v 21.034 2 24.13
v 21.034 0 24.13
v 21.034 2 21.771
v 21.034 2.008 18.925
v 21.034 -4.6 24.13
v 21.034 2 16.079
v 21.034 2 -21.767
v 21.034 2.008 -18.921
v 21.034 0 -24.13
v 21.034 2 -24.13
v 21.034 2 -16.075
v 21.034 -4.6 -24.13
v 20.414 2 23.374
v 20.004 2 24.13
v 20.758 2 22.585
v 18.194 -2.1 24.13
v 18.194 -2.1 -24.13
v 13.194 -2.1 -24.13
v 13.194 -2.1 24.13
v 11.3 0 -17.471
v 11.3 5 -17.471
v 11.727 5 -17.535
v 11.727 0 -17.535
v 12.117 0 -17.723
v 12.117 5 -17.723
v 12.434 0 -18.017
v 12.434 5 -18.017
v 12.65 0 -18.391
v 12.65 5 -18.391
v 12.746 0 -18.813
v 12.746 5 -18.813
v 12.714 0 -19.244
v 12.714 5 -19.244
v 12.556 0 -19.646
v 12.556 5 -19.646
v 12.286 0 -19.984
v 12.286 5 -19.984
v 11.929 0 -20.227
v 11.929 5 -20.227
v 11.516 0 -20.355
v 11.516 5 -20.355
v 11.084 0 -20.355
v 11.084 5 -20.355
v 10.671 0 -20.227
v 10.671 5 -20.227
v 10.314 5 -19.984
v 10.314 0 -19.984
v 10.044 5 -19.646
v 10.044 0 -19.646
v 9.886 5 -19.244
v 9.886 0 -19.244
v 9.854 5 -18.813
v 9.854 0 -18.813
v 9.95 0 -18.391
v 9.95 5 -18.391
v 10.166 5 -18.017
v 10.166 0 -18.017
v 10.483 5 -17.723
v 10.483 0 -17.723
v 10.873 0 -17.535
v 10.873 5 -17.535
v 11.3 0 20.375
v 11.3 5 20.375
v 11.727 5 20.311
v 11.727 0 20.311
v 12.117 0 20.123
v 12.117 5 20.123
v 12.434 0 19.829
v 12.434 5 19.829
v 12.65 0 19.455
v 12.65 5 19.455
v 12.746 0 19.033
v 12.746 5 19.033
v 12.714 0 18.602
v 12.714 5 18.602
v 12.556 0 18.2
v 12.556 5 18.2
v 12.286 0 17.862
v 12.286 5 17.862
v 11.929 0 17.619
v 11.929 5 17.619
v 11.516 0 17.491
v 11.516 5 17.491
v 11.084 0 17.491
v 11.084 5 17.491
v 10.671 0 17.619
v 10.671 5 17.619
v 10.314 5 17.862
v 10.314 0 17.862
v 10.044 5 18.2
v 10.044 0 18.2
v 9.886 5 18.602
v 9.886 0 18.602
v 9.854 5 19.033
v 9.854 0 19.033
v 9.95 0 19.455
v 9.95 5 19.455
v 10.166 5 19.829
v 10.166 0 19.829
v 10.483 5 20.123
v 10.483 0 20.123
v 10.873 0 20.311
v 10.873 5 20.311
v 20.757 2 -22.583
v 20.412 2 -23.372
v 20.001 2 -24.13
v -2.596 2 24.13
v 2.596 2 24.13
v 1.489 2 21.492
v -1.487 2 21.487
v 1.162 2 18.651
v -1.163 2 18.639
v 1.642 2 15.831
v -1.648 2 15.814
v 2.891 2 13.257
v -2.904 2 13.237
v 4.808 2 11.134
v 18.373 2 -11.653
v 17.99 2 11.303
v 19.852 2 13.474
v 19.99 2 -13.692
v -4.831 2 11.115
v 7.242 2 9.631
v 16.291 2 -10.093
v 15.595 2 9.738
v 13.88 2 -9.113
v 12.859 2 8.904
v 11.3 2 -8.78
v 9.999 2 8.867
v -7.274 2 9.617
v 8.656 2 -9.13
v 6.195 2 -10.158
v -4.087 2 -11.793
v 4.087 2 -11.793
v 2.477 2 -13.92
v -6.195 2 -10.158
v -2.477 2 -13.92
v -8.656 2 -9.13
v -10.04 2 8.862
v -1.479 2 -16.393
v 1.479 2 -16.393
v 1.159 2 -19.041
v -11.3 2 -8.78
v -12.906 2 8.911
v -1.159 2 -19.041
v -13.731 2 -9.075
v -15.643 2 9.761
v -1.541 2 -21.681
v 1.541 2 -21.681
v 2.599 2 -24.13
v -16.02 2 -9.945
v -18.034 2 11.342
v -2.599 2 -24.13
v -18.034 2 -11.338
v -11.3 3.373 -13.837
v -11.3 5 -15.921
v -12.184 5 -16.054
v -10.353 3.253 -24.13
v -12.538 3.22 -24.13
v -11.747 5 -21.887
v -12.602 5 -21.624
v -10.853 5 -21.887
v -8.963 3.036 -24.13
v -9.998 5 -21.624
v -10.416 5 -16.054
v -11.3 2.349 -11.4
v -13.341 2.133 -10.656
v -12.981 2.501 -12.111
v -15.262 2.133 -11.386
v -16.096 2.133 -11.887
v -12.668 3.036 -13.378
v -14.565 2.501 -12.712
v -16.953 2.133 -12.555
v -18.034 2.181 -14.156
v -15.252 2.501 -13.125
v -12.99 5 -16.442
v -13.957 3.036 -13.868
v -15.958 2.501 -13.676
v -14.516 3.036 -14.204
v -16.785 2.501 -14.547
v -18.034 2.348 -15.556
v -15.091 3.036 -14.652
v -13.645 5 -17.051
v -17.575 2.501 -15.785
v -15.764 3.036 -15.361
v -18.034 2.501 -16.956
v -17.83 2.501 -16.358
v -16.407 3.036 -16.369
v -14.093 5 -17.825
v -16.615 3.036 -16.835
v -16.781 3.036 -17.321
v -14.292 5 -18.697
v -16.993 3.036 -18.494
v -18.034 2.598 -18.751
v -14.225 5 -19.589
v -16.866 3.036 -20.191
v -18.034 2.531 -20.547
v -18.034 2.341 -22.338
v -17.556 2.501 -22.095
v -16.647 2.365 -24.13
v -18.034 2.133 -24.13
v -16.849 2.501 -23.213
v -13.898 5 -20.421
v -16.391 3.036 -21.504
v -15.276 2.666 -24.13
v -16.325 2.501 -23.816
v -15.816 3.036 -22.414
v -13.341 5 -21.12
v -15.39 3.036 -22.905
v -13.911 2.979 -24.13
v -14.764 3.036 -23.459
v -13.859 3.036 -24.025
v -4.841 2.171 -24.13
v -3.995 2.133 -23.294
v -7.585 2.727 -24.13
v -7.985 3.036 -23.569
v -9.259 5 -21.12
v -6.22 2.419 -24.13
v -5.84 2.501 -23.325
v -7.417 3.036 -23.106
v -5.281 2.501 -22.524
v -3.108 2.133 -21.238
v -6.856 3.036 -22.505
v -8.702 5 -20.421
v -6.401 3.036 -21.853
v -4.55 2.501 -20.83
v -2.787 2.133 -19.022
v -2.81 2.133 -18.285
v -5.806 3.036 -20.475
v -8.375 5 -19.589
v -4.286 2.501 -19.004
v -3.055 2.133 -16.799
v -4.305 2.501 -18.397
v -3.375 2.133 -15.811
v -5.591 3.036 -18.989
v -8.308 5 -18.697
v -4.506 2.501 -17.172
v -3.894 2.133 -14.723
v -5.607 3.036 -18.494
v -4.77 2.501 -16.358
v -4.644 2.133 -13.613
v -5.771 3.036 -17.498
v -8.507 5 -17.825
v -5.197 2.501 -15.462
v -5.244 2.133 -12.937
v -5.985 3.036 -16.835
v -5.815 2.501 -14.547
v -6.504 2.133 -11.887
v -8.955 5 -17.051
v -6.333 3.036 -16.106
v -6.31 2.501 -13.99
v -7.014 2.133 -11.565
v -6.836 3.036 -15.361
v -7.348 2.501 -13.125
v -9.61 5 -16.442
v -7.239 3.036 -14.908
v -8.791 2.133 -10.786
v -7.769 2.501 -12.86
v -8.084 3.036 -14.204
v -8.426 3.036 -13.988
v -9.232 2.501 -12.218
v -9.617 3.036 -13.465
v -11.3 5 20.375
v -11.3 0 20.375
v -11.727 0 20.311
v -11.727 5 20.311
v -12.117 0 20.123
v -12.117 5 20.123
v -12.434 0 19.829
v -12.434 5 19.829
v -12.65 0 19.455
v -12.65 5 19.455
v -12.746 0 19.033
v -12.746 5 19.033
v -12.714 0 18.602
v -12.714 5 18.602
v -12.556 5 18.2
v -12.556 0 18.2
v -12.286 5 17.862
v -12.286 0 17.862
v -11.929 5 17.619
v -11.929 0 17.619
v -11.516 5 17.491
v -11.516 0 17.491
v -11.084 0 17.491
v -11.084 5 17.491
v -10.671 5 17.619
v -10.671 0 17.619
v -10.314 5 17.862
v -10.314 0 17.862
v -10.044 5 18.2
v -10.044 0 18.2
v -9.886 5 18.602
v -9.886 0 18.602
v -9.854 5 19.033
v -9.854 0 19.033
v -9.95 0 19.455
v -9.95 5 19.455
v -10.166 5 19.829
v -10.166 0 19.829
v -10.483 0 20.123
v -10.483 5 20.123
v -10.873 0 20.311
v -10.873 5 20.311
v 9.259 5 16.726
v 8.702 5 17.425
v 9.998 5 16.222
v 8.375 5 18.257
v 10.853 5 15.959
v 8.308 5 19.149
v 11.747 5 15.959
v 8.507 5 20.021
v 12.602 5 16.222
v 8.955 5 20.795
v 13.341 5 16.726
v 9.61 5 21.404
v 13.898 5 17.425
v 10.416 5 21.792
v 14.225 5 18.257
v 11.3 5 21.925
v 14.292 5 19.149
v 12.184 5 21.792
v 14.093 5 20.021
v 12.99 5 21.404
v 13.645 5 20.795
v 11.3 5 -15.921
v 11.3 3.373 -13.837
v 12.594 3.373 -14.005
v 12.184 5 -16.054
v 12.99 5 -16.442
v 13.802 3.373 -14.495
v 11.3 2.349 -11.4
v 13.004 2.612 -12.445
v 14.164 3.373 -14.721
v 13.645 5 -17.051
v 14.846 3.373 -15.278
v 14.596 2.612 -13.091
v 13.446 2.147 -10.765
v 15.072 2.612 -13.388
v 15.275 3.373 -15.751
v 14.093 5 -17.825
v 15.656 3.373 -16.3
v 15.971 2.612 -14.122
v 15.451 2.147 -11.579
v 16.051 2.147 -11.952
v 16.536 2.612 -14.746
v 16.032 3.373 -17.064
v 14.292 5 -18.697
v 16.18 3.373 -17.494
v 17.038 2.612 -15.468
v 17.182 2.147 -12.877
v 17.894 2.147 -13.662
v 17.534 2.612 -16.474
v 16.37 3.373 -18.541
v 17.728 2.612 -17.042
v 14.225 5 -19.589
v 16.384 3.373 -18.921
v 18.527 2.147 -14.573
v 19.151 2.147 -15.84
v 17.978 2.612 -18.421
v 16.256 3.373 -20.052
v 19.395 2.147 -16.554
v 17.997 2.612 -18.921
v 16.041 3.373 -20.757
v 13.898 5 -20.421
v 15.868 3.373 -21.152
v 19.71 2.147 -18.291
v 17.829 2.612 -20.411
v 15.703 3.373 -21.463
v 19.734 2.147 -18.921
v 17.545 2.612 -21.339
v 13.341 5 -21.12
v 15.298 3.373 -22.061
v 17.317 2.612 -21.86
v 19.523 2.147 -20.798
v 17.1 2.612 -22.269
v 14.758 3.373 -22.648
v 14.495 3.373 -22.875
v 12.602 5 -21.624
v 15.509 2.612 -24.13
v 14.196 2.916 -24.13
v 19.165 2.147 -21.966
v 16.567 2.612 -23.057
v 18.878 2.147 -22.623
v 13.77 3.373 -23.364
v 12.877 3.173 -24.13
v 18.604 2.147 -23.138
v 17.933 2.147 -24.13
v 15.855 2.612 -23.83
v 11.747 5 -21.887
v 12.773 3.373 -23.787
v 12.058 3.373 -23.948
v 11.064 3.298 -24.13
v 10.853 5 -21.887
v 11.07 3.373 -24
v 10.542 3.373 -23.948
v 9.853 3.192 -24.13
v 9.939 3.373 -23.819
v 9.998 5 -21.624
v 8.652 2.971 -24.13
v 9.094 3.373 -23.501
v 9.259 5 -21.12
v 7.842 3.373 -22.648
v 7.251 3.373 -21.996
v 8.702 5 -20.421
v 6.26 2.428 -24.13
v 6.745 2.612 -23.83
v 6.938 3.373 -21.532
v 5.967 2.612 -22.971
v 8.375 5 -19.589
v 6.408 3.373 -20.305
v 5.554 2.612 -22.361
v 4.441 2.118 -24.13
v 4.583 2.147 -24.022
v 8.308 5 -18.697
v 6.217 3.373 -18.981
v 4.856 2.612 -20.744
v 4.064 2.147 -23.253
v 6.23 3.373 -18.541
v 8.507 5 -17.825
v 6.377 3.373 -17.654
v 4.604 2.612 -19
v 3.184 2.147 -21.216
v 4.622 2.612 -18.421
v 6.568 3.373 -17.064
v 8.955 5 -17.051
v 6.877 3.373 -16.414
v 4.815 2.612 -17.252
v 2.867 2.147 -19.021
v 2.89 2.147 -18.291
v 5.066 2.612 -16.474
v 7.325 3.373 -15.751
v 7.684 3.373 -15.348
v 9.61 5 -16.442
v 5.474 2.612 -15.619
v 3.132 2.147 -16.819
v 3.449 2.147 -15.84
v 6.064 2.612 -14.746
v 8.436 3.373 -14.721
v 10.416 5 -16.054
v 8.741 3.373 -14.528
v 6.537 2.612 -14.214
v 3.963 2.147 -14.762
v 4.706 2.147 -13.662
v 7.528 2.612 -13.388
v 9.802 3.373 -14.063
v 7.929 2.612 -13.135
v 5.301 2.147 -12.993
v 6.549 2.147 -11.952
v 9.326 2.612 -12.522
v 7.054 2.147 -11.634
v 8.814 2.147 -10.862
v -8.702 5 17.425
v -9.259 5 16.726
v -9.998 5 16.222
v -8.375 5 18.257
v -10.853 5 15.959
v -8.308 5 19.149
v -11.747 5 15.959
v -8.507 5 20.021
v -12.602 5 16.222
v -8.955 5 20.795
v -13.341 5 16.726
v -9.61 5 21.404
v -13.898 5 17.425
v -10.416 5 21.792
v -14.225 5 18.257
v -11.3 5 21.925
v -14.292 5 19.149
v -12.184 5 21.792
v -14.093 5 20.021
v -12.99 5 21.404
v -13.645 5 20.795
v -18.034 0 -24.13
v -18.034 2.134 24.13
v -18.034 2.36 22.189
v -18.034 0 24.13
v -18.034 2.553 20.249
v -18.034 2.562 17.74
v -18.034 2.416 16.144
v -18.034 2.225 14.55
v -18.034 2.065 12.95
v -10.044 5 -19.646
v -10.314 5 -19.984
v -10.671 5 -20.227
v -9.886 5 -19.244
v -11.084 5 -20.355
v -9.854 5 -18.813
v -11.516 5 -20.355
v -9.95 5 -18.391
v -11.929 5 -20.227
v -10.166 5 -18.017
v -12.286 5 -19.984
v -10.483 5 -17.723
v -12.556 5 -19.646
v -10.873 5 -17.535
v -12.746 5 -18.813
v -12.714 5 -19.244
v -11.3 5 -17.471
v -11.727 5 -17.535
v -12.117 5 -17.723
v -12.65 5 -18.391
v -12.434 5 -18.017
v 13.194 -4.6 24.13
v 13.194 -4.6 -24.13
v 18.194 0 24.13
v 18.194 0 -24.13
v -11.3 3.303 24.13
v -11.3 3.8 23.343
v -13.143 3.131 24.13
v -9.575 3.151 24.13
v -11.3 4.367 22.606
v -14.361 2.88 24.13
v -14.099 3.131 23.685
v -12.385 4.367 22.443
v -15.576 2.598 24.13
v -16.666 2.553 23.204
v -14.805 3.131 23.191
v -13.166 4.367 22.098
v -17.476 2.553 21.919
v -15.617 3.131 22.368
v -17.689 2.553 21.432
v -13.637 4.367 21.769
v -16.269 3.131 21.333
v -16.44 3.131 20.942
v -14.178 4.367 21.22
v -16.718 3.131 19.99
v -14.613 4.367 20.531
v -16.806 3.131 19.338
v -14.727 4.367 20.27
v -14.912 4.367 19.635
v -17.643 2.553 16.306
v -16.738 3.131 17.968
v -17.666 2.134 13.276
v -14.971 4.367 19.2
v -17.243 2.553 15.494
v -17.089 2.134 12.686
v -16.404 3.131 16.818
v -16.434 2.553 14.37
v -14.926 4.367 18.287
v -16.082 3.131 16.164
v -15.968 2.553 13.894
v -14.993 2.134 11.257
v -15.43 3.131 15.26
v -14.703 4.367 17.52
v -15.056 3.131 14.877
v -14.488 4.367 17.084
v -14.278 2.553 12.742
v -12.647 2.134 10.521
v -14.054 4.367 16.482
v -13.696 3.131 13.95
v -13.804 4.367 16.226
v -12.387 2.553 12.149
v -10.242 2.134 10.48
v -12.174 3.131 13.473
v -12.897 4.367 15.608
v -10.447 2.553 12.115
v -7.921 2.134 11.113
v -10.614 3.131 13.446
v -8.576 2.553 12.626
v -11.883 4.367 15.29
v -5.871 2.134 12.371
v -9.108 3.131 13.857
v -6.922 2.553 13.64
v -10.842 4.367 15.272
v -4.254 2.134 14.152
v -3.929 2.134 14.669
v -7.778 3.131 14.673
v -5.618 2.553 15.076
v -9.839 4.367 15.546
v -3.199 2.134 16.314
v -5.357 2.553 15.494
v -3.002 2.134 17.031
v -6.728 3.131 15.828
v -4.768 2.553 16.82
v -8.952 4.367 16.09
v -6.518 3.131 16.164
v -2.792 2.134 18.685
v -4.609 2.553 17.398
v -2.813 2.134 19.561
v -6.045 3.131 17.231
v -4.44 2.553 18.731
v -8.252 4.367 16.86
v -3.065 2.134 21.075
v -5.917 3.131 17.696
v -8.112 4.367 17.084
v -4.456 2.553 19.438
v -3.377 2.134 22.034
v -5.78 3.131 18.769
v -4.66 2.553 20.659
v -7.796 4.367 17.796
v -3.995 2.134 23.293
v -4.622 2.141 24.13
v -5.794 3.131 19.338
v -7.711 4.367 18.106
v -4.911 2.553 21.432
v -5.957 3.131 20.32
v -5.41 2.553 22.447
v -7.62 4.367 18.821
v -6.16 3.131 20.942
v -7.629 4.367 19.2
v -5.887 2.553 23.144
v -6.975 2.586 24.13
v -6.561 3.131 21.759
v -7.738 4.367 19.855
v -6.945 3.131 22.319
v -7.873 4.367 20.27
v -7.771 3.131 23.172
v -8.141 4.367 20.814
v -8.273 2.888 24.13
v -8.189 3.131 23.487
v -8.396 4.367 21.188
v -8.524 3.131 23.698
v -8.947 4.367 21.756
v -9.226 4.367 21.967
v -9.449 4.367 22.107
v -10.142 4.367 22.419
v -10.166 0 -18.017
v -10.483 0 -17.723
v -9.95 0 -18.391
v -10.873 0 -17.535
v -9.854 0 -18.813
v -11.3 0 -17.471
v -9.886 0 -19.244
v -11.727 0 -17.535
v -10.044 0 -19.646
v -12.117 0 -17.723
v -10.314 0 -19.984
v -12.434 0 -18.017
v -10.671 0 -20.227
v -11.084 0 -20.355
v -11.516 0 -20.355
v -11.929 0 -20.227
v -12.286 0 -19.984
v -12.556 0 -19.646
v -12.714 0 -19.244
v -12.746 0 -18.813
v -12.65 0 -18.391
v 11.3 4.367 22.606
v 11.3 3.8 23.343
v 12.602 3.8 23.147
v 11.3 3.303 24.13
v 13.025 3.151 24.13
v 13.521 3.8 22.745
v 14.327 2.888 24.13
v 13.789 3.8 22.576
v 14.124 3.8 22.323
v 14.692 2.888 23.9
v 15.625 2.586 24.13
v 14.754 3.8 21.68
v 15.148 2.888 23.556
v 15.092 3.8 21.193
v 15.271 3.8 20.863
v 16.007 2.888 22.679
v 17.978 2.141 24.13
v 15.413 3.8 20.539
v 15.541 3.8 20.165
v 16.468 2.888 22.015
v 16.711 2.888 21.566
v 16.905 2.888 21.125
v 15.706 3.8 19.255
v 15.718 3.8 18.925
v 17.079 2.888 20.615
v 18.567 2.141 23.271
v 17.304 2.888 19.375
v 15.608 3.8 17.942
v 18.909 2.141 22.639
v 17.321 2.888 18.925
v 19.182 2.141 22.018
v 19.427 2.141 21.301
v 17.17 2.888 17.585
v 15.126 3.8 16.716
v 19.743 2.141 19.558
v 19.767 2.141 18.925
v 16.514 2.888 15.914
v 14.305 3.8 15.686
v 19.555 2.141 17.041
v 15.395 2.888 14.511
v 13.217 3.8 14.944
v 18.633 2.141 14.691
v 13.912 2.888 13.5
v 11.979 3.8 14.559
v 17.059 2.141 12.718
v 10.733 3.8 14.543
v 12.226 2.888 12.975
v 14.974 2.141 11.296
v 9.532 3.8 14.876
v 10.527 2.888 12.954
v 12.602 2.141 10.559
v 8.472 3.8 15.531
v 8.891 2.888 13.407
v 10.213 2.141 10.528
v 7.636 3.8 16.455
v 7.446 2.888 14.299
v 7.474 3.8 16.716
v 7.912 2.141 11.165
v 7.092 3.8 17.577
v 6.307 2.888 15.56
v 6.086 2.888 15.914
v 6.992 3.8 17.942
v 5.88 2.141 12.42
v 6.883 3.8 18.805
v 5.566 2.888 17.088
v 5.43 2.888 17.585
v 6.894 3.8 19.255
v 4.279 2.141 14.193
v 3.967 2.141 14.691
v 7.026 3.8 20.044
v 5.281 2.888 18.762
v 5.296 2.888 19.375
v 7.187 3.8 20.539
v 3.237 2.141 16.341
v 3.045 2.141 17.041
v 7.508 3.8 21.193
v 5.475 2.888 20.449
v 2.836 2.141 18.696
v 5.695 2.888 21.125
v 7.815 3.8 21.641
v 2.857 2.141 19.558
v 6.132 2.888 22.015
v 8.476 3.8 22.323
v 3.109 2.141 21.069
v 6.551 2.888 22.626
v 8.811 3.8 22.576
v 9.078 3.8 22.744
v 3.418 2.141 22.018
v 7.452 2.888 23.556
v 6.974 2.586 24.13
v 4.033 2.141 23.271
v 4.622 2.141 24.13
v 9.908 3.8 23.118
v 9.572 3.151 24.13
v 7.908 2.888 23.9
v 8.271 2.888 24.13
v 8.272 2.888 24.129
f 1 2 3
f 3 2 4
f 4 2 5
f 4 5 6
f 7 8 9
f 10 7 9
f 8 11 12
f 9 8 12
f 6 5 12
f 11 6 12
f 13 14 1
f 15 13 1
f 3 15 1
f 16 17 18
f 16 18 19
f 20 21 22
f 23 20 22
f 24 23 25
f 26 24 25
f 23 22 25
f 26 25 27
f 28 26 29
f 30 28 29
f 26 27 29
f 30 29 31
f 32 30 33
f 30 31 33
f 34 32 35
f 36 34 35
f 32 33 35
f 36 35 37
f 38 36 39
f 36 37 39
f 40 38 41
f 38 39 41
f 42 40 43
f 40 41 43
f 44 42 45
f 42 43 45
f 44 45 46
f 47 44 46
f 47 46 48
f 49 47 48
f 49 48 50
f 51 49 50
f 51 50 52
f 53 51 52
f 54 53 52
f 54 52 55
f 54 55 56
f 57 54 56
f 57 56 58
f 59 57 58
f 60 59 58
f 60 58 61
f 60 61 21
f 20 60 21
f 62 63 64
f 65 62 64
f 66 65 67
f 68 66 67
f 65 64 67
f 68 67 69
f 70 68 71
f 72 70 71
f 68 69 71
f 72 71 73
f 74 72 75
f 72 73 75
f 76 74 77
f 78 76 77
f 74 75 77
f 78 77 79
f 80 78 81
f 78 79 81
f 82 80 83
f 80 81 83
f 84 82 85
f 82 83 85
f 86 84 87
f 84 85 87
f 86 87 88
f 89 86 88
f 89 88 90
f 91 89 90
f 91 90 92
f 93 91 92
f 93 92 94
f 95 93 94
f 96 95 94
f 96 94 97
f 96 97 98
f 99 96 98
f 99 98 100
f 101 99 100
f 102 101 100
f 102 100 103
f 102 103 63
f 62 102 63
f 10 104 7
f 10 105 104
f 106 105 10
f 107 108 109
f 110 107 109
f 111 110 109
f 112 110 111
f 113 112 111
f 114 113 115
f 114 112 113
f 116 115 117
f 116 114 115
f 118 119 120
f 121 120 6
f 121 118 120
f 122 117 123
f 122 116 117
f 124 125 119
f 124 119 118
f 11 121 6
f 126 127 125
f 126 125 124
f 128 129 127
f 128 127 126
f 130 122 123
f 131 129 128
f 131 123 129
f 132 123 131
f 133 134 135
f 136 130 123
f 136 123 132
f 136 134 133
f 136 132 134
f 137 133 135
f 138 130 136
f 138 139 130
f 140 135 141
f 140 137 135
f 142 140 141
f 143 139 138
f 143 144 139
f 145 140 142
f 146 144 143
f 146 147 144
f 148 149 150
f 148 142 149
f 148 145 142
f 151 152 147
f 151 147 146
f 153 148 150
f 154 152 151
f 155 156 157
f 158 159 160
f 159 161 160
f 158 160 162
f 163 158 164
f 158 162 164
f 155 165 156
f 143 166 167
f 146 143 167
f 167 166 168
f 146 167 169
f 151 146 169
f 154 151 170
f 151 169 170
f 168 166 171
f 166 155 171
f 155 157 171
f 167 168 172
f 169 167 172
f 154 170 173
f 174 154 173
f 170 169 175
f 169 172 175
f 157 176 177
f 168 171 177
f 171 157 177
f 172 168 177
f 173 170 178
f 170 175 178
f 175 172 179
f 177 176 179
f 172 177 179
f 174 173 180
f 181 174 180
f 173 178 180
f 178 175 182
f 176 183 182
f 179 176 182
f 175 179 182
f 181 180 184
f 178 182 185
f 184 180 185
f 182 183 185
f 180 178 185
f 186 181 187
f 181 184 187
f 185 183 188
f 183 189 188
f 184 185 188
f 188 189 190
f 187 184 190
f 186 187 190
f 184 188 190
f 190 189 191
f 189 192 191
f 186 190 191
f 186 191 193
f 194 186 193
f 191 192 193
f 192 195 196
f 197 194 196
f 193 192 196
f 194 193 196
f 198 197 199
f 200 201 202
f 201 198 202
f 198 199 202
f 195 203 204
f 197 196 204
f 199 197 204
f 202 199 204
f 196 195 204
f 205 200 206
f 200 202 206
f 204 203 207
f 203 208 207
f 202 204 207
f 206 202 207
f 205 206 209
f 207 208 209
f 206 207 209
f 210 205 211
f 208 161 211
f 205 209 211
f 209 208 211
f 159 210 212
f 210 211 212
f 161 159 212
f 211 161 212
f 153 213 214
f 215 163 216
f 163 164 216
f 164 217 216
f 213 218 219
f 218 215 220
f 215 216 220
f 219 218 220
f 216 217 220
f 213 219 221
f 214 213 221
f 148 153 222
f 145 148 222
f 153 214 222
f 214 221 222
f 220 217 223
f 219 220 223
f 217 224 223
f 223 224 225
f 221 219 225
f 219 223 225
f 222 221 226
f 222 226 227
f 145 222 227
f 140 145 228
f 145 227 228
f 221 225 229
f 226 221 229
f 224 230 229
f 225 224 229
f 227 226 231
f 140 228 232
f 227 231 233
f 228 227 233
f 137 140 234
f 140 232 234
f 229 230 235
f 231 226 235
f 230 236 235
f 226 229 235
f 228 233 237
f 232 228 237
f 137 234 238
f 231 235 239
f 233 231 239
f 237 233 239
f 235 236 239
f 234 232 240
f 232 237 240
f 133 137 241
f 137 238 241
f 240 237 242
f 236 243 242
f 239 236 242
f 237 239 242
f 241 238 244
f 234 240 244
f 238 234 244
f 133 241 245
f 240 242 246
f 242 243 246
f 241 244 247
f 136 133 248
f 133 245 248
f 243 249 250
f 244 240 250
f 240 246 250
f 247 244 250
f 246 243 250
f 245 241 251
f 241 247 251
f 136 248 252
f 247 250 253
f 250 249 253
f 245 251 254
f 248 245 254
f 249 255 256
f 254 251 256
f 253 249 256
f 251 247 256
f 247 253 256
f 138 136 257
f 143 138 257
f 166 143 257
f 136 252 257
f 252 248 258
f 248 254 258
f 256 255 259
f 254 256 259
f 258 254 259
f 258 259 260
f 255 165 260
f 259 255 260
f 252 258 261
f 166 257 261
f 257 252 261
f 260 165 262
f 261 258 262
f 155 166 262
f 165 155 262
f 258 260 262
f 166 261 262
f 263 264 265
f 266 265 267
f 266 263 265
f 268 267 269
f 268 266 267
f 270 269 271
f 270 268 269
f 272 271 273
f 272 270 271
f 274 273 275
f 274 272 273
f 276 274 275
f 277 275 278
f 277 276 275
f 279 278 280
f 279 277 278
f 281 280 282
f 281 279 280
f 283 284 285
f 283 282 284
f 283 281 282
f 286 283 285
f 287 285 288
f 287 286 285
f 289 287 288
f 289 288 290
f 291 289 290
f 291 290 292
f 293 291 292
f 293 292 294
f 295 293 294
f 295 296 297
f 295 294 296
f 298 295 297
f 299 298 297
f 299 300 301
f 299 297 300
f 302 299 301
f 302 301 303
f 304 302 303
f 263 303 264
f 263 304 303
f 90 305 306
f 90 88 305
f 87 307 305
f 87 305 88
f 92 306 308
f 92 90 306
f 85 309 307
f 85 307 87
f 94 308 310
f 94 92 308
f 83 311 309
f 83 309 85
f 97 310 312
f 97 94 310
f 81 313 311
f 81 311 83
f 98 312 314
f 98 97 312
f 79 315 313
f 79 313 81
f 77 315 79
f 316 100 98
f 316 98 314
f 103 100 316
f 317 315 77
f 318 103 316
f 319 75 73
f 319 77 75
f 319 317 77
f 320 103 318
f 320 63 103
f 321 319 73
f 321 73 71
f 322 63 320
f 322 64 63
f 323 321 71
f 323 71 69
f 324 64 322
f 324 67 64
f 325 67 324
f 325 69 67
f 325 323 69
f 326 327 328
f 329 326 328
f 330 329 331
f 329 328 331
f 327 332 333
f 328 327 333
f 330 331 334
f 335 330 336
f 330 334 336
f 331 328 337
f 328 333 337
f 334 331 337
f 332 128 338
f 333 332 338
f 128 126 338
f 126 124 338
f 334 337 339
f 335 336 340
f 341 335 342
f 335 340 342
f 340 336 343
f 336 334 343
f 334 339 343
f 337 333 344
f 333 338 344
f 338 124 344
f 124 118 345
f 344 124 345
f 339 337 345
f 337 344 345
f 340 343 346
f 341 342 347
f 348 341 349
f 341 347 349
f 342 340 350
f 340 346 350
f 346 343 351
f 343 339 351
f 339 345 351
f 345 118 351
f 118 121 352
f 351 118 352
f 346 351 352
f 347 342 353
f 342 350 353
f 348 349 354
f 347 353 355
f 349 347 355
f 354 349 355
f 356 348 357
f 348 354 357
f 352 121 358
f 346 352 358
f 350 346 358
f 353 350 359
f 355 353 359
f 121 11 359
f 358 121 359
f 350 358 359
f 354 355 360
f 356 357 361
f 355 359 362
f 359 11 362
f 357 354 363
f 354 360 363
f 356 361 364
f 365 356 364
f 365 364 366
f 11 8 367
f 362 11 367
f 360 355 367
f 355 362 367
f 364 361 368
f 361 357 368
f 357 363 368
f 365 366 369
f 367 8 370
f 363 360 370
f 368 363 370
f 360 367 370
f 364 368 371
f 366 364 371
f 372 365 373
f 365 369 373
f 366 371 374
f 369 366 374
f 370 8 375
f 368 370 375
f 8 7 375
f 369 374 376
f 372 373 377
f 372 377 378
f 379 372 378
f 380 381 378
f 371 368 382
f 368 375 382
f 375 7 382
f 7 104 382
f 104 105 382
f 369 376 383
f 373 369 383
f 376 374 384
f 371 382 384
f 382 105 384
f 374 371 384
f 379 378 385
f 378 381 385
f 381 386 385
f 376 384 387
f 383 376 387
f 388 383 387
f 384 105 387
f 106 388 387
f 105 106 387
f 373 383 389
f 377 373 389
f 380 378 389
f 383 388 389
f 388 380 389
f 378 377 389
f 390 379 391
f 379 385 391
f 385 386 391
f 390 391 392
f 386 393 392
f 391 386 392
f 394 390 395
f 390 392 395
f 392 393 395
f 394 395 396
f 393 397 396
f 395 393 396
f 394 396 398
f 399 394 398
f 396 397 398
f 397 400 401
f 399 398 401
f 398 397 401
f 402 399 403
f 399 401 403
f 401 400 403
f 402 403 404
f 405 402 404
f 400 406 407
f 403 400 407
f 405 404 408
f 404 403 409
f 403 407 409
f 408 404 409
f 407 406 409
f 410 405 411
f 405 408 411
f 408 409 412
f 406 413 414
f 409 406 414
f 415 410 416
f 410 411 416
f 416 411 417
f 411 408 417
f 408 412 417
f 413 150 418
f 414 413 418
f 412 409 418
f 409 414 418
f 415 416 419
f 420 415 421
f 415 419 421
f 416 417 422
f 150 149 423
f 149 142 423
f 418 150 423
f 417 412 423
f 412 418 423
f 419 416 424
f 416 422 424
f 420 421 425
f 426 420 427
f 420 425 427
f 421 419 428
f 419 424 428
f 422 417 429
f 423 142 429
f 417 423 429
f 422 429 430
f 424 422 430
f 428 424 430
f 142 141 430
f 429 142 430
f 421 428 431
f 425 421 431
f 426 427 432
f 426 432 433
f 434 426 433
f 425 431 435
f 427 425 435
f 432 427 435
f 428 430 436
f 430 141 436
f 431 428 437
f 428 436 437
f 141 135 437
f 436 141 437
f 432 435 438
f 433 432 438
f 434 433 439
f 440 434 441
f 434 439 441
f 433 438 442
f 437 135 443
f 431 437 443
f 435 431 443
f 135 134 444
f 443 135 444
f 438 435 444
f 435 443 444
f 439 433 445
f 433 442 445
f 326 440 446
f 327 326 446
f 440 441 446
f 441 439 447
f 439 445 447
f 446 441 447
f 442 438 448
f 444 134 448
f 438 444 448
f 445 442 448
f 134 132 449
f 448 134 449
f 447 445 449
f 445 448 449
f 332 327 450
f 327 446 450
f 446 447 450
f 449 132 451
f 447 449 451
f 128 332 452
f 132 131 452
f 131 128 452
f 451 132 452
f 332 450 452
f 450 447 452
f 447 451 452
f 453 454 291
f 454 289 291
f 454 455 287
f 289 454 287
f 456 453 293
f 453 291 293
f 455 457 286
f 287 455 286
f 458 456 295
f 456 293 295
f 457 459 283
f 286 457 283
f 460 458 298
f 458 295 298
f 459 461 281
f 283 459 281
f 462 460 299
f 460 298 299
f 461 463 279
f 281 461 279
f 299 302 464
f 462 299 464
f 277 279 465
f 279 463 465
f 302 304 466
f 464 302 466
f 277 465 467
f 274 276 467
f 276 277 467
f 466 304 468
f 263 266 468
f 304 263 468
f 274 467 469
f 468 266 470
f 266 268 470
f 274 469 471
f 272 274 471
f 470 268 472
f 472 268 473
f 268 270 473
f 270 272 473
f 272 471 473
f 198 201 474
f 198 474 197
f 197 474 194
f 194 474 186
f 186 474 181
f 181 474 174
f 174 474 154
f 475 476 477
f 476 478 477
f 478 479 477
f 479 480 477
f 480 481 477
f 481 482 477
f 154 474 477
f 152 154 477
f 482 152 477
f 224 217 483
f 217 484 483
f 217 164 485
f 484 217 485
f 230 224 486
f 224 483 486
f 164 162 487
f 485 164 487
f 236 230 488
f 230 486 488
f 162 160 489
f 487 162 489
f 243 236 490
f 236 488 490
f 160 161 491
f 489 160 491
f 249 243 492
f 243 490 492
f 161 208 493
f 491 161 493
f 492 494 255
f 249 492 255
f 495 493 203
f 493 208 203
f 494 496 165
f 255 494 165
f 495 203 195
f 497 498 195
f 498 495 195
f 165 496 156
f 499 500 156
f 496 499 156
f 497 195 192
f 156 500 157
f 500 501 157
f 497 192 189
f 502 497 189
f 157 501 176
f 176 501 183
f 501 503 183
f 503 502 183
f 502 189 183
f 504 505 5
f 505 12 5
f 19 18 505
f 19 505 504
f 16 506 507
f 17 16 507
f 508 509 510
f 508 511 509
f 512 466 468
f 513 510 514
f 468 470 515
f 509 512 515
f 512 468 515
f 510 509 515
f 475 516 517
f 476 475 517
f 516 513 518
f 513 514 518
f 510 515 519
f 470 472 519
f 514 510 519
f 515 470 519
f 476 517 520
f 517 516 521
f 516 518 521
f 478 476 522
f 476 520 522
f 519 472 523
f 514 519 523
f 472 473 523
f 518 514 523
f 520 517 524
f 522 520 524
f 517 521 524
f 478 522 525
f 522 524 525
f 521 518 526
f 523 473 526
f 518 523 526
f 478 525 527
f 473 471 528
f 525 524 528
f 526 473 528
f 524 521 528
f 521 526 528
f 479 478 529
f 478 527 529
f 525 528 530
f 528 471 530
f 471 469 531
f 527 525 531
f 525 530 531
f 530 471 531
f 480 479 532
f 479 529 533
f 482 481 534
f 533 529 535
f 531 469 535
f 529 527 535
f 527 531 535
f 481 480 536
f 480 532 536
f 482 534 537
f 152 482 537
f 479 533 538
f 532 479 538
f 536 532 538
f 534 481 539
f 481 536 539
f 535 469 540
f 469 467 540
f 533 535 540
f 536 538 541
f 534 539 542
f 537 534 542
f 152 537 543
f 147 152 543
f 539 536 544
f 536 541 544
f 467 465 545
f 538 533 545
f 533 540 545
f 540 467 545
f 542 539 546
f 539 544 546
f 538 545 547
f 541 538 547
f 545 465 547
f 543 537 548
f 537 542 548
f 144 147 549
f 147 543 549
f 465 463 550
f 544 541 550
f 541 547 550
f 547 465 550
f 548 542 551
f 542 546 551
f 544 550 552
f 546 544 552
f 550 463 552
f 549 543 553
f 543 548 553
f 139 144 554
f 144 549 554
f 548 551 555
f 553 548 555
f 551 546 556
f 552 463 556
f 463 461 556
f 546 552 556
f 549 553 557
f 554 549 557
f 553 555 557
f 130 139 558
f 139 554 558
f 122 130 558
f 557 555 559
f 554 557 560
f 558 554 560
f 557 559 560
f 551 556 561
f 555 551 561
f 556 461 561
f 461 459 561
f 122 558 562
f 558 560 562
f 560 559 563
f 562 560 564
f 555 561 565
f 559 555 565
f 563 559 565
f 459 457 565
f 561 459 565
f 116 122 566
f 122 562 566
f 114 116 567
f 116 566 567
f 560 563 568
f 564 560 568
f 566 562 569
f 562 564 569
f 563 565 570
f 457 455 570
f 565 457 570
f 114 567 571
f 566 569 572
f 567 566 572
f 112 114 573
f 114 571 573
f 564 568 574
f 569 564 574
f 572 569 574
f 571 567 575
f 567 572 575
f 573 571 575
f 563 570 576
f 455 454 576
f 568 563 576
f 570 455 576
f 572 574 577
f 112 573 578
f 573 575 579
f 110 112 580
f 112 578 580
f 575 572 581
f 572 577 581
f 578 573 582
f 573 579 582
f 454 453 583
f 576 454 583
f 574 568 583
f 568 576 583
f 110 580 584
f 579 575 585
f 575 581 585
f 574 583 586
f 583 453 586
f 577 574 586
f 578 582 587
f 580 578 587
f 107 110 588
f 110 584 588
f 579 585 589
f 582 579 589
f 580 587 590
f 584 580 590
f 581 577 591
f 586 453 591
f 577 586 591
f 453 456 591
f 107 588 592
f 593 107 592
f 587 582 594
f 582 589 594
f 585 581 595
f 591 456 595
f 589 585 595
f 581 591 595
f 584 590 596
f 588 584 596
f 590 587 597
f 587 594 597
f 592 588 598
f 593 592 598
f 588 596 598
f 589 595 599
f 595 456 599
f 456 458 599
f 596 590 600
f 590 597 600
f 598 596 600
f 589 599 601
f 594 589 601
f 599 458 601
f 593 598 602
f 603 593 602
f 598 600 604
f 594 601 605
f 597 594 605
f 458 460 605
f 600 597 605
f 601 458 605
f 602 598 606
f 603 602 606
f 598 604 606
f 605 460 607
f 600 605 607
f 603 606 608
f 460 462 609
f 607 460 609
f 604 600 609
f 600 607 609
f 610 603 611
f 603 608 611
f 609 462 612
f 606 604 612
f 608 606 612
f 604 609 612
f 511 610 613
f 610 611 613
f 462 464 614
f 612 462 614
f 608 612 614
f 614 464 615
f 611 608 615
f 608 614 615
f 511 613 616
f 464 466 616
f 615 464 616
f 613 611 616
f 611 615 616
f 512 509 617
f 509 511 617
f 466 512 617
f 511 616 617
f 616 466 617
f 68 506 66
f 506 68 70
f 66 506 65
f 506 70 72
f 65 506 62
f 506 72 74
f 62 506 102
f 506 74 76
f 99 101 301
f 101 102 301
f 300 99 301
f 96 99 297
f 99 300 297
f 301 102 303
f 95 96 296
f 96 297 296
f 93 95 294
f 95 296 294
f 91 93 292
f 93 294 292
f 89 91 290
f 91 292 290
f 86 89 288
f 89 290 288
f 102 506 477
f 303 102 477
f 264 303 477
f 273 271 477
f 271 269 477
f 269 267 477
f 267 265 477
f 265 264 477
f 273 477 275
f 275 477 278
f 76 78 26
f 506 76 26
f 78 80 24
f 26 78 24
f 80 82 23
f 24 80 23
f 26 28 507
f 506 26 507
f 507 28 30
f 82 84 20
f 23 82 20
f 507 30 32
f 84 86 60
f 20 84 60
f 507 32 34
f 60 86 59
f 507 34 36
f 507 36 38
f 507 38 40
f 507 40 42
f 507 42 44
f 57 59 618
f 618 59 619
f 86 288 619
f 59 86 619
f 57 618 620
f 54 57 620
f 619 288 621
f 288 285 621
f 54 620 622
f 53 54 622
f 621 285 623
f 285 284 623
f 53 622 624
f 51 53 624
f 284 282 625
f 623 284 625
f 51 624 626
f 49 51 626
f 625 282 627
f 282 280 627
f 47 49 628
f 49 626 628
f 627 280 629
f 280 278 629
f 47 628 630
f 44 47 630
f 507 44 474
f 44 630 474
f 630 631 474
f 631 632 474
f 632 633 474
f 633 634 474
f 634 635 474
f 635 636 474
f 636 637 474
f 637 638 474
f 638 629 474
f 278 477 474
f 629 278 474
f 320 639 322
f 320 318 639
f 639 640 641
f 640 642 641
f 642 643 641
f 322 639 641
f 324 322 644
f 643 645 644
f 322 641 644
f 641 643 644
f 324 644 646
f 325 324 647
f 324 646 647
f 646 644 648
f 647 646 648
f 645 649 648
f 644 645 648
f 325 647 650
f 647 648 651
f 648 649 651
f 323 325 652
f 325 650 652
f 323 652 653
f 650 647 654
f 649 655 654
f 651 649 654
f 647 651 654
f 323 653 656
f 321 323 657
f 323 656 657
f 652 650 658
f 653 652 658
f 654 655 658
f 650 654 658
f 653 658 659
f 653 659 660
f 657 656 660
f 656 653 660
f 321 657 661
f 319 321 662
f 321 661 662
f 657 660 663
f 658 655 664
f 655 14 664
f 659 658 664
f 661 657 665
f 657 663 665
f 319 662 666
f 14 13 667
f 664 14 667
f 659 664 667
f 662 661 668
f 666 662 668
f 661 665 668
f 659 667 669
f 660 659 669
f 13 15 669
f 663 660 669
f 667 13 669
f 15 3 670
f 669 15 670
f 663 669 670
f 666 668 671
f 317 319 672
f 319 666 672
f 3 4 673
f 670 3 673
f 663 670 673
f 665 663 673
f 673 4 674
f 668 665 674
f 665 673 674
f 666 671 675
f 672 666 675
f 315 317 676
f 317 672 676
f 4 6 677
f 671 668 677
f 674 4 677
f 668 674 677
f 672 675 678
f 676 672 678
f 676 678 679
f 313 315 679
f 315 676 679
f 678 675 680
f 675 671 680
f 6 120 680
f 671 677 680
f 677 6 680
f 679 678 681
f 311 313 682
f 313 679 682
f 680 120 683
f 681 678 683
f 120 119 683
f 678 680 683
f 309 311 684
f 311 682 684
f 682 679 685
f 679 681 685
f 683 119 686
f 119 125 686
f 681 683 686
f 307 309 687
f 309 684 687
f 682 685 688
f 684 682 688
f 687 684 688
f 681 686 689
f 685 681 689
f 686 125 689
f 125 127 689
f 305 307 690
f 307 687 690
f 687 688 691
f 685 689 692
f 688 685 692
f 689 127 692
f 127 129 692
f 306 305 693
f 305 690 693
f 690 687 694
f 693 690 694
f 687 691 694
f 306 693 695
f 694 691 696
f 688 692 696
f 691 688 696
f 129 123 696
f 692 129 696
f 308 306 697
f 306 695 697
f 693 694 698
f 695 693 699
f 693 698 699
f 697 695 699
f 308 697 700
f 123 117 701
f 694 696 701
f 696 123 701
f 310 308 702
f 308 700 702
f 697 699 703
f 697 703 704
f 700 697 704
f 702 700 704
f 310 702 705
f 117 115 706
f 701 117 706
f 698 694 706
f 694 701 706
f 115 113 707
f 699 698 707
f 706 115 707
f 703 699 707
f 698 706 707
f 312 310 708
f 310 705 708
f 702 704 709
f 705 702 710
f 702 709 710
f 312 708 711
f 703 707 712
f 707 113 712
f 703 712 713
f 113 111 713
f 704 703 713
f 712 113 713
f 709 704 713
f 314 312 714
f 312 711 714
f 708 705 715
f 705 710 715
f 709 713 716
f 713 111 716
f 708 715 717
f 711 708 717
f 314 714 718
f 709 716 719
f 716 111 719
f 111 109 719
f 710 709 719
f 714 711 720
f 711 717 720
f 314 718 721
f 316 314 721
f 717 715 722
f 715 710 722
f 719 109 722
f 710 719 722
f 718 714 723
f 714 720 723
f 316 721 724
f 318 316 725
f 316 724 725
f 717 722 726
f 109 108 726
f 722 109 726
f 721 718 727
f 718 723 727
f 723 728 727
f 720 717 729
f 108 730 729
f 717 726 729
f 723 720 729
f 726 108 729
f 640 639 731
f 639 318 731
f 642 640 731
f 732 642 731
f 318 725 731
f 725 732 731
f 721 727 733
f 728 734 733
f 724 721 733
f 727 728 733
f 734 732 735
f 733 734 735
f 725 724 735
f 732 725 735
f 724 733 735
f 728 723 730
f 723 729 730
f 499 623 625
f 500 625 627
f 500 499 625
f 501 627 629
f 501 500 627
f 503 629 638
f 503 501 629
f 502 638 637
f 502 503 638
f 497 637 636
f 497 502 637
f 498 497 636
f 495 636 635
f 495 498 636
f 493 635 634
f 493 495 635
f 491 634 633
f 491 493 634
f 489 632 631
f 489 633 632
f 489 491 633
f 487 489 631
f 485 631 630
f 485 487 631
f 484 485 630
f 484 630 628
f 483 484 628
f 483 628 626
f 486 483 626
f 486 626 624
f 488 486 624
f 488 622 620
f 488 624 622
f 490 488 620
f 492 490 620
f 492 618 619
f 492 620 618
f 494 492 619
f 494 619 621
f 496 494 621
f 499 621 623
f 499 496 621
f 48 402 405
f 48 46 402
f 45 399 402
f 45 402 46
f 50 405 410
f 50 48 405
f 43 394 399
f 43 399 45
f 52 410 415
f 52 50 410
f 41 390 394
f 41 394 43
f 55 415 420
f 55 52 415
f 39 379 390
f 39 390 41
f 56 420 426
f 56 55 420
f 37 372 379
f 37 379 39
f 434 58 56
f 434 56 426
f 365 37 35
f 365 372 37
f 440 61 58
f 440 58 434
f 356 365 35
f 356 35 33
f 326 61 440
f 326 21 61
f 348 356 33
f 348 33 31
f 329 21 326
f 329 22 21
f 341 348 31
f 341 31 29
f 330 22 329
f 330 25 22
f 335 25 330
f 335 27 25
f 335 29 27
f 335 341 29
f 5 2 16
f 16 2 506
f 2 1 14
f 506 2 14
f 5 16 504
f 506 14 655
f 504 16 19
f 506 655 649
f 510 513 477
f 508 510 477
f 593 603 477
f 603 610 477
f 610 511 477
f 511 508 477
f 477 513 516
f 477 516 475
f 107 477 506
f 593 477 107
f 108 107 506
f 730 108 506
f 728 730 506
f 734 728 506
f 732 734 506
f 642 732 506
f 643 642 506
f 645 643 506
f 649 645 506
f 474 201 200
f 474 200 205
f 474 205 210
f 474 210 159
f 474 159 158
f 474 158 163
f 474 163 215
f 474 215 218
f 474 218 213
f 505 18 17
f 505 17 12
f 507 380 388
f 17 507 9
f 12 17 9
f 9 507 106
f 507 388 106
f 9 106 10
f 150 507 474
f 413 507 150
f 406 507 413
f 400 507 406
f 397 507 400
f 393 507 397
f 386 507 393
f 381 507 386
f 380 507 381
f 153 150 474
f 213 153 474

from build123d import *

# Parameters (mm, degrees)
ESQUISSE1_W             = 36.068
ESQUISSE1_H             = 48.26
BOSS_EXTRU_1_DEPTH      = 2
ESQUISSE4_R             = 3
BOSS_EXTRU_2_DEPTH      = 3
ESQUISSE6_R             = 1.45
ENL_V_MAT_EXTRU_1_DEPTH = 31.536569159
ESQUISSE10_W            = 48.26
ESQUISSE10_H            = 2
BOSS_EXTRU_3_DEPTH      = 3
ESQUISSE11_W            = 2.839594579
ESQUISSE11_H            = 48.26
BOSS_EXTRU_4_DEPTH      = 4.6
ESQUISSE12_W            = 48.26
ESQUISSE12_H            = 2.5
BOSS_EXTRU_5_DEPTH      = 5
CONG_1_R                = 10
CONG_2_R                = 10


with BuildPart() as part:
    # Esquisse1 → Boss.-Extru.1 (new body)
    with BuildSketch(Plane(origin=(0, 0, 0), x_dir=(1, 0, 0), z_dir=(0, 1, 0))):
        Rectangle(ESQUISSE1_W, ESQUISSE1_H)
    extrude(amount=BOSS_EXTRU_1_DEPTH)

    # Esquisse4 → Boss.-Extru.2 (add)
    with BuildSketch(Plane(origin=(0, 2, 0), x_dir=(1, 0, 0), z_dir=(0, 1, 0))):
        with Locations(Location((11.3, 18.921, 0), (0, 0, 270))):
            Circle(ESQUISSE4_R)
        with Locations(Location((11.3, -18.925, 0), (0, 0, 270))):
            Circle(ESQUISSE4_R)
    boss_extru_2 = extrude(amount=BOSS_EXTRU_2_DEPTH)

    # Esquisse6 → Enlèv. mat.-Extru.1 (cut, through all)
    with BuildSketch(Plane(origin=(0, 5, 0), x_dir=(1, 0, 0), z_dir=(0, 1, 0))):
        with Locations(Location((11.3, 18.921, 0), (0, 0, 270))):
            Circle(ESQUISSE6_R)
        with Locations(Location((11.3, -18.925, 0), (0, 0, 270))):
            Circle(ESQUISSE6_R)
    enl_v_mat_extru_1 = extrude(amount=-ENL_V_MAT_EXTRU_1_DEPTH, mode=Mode.SUBTRACT)

    # Symétrie1: Boss.-Extru.2, Enlèv. mat.-Extru.1 across plane
    add(boss_extru_2.mirror(Plane(origin=(0, 0, 0), x_dir=(0, 0, 1), z_dir=(1, 0, 0))))
    add(enl_v_mat_extru_1.mirror(Plane(origin=(0, 0, 0), x_dir=(0, 0, 1), z_dir=(1, 0, 0))), mode=Mode.SUBTRACT)

    # Esquisse10 → Boss.-Extru.3 (add)
    with BuildSketch(Plane(origin=(18.034, 0, 0), x_dir=(0, 0, -1), z_dir=(1, 0, 0))):
        with Locations((0, 1)):
            Rectangle(ESQUISSE10_W, ESQUISSE10_H)
    extrude(amount=BOSS_EXTRU_3_DEPTH)

    # Esquisse11 → Boss.-Extru.4 (add)
    with BuildSketch(Plane(origin=(0, 0, 0), x_dir=(-1, 0, 0), z_dir=(0, -1, 0))):
        with Locations((-19.614202711, 0)):
            Rectangle(ESQUISSE11_W, ESQUISSE11_H)
    extrude(amount=BOSS_EXTRU_4_DEPTH)

    # Esquisse12 → Boss.-Extru.5 (add)
    with BuildSketch(Plane.ZY.offset(-18.194405421)):
        with Locations((0, -3.35)):
            Rectangle(ESQUISSE12_W, ESQUISSE12_H)
    extrude(amount=BOSS_EXTRU_5_DEPTH)

    # Congé1
    # the kernel refuses this fillet: 10 mm, written as the material it adds along each edge
    with BuildSketch(Plane(origin=(-11.3, 2, -18.921), x_dir=(0, 0, 1), z_dir=(1, 0, 0))) as cong_1_piece_1_section:
        with BuildLine():
            CenterArc((10.141428429, -10), CONG_1_R, 90, 45.572995999)
            Line((10.141428429, 0), (10.141428429, 0.2))
            Line((10.141428429, 0.2), (3, 0.2))
            Line((3, 0.2), (2.8, 0))
            ThreePointArc((2.8, 0), (2.8, -1.5), (2.857171431, -2.86))
            Line((2.857171431, -2.86), (3, -3))
        make_face()
    cong_1_piece_1 = revolve(axis=Axis((-11.3, 2, -18.921), (0, -1, 0)), mode=Mode.PRIVATE)
    cong_1_piece_1 = split(cong_1_piece_1, bisect_by=Plane(origin=(-14.721075744, 4.069321611, -24.13), z_dir=(0, 0, 1)), keep=Keep.TOP, mode=Mode.PRIVATE)
    cong_1_piece_1 = split(cong_1_piece_1, bisect_by=Plane(origin=(-18.034, 4.069321611, -16.945840998), z_dir=(1, 0, 0)), keep=Keep.TOP, mode=Mode.PRIVATE)
    add(cong_1_piece_1)
    with BuildSketch(Plane(origin=(-11.3, 2, 18.925), x_dir=(0, 0, 1), z_dir=(1, 0, 0))) as cong_1_piece_2_section:
        with BuildLine():
            CenterArc((10.141428429, -10), CONG_1_R, 90, 45.572995999)
            Line((10.141428429, 0), (10.141428429, 0.2))
            Line((10.141428429, 0.2), (3, 0.2))
            Line((3, 0.2), (2.8, 0))
            ThreePointArc((2.8, 0), (2.8, -1.5), (2.857171431, -2.86))
            Line((2.857171431, -2.86), (3, -3))
        make_face()
    cong_1_piece_2 = revolve(axis=Axis((-11.3, 2, 18.925), (0, -1, 0)), mode=Mode.PRIVATE)
    cong_1_piece_2 = split(cong_1_piece_2, bisect_by=Plane(origin=(-11.3, 2.724138959, 24.13), z_dir=(0, 0, -1)), keep=Keep.TOP, mode=Mode.PRIVATE)
    cong_1_piece_2 = split(cong_1_piece_2, bisect_by=Plane(origin=(-18.034, 2.724138959, 12.680212615), z_dir=(1, 0, 0)), keep=Keep.TOP, mode=Mode.PRIVATE)
    add(cong_1_piece_2)

    # Congé2
    # the kernel refuses this fillet: 10 mm, written as the material it adds along each edge
    with BuildSketch(Plane(origin=(11.3, 2, -18.921), x_dir=(0, 0, 1), z_dir=(-1, 0, 0))) as cong_2_piece_1_section:
        with BuildLine():
            CenterArc((10.141428429, 10), CONG_2_R, 224.427004001, 45.572995999)
            Line((10.141428429, 0), (10.141428429, -0.2))
            Line((10.141428429, -0.2), (3, -0.2))
            Line((3, -0.2), (2.8, 0))
            ThreePointArc((2.8, 0), (2.8, 1.5), (2.857171431, 2.86))
            Line((2.857171431, 2.86), (3, 3))
        make_face()
    cong_2_piece_1 = revolve(axis=Axis((11.3, 2, -18.921), (0, 1, 0)), mode=Mode.PRIVATE)
    cong_2_piece_1 = split(cong_2_piece_1, bisect_by=Plane(origin=(14.72056947, 4.068572758, -24.13), z_dir=(0, 0, 1)), keep=Keep.TOP, mode=Mode.PRIVATE)
    cong_2_piece_1 = split(cong_2_piece_1, bisect_by=Plane(origin=(21.034, 4.068572758, -16.946133295), z_dir=(-1, 0, 0)), keep=Keep.TOP, mode=Mode.PRIVATE)
    add(cong_2_piece_1)
    with BuildSketch(Plane(origin=(11.3, 2, 18.925), x_dir=(0, 0, 1), z_dir=(-1, 0, 0))) as cong_2_piece_2_section:
        with BuildLine():
            CenterArc((10.141428429, 10), CONG_2_R, 224.427004001, 45.572995999)
            Line((10.141428429, 0), (10.141428429, -0.2))
            Line((10.141428429, -0.2), (3, -0.2))
            Line((3, -0.2), (2.8, 0))
            ThreePointArc((2.8, 0), (2.8, 1.5), (2.857171431, 2.86))
            Line((2.857171431, 2.86), (3, 3))
        make_face()
    cong_2_piece_2 = revolve(axis=Axis((11.3, 2, 18.925), (0, 1, 0)), mode=Mode.PRIVATE)
    cong_2_piece_2 = split(cong_2_piece_2, bisect_by=Plane(origin=(21.034, 2.723263104, 12.680580548), z_dir=(-1, 0, 0)), keep=Keep.TOP, mode=Mode.PRIVATE)
    cong_2_piece_2 = split(cong_2_piece_2, bisect_by=Plane(origin=(11.3, 2.723263104, 24.13), z_dir=(0, 0, -1)), keep=Keep.TOP, mode=Mode.PRIVATE)
    add(cong_2_piece_2)


solid = part.part
